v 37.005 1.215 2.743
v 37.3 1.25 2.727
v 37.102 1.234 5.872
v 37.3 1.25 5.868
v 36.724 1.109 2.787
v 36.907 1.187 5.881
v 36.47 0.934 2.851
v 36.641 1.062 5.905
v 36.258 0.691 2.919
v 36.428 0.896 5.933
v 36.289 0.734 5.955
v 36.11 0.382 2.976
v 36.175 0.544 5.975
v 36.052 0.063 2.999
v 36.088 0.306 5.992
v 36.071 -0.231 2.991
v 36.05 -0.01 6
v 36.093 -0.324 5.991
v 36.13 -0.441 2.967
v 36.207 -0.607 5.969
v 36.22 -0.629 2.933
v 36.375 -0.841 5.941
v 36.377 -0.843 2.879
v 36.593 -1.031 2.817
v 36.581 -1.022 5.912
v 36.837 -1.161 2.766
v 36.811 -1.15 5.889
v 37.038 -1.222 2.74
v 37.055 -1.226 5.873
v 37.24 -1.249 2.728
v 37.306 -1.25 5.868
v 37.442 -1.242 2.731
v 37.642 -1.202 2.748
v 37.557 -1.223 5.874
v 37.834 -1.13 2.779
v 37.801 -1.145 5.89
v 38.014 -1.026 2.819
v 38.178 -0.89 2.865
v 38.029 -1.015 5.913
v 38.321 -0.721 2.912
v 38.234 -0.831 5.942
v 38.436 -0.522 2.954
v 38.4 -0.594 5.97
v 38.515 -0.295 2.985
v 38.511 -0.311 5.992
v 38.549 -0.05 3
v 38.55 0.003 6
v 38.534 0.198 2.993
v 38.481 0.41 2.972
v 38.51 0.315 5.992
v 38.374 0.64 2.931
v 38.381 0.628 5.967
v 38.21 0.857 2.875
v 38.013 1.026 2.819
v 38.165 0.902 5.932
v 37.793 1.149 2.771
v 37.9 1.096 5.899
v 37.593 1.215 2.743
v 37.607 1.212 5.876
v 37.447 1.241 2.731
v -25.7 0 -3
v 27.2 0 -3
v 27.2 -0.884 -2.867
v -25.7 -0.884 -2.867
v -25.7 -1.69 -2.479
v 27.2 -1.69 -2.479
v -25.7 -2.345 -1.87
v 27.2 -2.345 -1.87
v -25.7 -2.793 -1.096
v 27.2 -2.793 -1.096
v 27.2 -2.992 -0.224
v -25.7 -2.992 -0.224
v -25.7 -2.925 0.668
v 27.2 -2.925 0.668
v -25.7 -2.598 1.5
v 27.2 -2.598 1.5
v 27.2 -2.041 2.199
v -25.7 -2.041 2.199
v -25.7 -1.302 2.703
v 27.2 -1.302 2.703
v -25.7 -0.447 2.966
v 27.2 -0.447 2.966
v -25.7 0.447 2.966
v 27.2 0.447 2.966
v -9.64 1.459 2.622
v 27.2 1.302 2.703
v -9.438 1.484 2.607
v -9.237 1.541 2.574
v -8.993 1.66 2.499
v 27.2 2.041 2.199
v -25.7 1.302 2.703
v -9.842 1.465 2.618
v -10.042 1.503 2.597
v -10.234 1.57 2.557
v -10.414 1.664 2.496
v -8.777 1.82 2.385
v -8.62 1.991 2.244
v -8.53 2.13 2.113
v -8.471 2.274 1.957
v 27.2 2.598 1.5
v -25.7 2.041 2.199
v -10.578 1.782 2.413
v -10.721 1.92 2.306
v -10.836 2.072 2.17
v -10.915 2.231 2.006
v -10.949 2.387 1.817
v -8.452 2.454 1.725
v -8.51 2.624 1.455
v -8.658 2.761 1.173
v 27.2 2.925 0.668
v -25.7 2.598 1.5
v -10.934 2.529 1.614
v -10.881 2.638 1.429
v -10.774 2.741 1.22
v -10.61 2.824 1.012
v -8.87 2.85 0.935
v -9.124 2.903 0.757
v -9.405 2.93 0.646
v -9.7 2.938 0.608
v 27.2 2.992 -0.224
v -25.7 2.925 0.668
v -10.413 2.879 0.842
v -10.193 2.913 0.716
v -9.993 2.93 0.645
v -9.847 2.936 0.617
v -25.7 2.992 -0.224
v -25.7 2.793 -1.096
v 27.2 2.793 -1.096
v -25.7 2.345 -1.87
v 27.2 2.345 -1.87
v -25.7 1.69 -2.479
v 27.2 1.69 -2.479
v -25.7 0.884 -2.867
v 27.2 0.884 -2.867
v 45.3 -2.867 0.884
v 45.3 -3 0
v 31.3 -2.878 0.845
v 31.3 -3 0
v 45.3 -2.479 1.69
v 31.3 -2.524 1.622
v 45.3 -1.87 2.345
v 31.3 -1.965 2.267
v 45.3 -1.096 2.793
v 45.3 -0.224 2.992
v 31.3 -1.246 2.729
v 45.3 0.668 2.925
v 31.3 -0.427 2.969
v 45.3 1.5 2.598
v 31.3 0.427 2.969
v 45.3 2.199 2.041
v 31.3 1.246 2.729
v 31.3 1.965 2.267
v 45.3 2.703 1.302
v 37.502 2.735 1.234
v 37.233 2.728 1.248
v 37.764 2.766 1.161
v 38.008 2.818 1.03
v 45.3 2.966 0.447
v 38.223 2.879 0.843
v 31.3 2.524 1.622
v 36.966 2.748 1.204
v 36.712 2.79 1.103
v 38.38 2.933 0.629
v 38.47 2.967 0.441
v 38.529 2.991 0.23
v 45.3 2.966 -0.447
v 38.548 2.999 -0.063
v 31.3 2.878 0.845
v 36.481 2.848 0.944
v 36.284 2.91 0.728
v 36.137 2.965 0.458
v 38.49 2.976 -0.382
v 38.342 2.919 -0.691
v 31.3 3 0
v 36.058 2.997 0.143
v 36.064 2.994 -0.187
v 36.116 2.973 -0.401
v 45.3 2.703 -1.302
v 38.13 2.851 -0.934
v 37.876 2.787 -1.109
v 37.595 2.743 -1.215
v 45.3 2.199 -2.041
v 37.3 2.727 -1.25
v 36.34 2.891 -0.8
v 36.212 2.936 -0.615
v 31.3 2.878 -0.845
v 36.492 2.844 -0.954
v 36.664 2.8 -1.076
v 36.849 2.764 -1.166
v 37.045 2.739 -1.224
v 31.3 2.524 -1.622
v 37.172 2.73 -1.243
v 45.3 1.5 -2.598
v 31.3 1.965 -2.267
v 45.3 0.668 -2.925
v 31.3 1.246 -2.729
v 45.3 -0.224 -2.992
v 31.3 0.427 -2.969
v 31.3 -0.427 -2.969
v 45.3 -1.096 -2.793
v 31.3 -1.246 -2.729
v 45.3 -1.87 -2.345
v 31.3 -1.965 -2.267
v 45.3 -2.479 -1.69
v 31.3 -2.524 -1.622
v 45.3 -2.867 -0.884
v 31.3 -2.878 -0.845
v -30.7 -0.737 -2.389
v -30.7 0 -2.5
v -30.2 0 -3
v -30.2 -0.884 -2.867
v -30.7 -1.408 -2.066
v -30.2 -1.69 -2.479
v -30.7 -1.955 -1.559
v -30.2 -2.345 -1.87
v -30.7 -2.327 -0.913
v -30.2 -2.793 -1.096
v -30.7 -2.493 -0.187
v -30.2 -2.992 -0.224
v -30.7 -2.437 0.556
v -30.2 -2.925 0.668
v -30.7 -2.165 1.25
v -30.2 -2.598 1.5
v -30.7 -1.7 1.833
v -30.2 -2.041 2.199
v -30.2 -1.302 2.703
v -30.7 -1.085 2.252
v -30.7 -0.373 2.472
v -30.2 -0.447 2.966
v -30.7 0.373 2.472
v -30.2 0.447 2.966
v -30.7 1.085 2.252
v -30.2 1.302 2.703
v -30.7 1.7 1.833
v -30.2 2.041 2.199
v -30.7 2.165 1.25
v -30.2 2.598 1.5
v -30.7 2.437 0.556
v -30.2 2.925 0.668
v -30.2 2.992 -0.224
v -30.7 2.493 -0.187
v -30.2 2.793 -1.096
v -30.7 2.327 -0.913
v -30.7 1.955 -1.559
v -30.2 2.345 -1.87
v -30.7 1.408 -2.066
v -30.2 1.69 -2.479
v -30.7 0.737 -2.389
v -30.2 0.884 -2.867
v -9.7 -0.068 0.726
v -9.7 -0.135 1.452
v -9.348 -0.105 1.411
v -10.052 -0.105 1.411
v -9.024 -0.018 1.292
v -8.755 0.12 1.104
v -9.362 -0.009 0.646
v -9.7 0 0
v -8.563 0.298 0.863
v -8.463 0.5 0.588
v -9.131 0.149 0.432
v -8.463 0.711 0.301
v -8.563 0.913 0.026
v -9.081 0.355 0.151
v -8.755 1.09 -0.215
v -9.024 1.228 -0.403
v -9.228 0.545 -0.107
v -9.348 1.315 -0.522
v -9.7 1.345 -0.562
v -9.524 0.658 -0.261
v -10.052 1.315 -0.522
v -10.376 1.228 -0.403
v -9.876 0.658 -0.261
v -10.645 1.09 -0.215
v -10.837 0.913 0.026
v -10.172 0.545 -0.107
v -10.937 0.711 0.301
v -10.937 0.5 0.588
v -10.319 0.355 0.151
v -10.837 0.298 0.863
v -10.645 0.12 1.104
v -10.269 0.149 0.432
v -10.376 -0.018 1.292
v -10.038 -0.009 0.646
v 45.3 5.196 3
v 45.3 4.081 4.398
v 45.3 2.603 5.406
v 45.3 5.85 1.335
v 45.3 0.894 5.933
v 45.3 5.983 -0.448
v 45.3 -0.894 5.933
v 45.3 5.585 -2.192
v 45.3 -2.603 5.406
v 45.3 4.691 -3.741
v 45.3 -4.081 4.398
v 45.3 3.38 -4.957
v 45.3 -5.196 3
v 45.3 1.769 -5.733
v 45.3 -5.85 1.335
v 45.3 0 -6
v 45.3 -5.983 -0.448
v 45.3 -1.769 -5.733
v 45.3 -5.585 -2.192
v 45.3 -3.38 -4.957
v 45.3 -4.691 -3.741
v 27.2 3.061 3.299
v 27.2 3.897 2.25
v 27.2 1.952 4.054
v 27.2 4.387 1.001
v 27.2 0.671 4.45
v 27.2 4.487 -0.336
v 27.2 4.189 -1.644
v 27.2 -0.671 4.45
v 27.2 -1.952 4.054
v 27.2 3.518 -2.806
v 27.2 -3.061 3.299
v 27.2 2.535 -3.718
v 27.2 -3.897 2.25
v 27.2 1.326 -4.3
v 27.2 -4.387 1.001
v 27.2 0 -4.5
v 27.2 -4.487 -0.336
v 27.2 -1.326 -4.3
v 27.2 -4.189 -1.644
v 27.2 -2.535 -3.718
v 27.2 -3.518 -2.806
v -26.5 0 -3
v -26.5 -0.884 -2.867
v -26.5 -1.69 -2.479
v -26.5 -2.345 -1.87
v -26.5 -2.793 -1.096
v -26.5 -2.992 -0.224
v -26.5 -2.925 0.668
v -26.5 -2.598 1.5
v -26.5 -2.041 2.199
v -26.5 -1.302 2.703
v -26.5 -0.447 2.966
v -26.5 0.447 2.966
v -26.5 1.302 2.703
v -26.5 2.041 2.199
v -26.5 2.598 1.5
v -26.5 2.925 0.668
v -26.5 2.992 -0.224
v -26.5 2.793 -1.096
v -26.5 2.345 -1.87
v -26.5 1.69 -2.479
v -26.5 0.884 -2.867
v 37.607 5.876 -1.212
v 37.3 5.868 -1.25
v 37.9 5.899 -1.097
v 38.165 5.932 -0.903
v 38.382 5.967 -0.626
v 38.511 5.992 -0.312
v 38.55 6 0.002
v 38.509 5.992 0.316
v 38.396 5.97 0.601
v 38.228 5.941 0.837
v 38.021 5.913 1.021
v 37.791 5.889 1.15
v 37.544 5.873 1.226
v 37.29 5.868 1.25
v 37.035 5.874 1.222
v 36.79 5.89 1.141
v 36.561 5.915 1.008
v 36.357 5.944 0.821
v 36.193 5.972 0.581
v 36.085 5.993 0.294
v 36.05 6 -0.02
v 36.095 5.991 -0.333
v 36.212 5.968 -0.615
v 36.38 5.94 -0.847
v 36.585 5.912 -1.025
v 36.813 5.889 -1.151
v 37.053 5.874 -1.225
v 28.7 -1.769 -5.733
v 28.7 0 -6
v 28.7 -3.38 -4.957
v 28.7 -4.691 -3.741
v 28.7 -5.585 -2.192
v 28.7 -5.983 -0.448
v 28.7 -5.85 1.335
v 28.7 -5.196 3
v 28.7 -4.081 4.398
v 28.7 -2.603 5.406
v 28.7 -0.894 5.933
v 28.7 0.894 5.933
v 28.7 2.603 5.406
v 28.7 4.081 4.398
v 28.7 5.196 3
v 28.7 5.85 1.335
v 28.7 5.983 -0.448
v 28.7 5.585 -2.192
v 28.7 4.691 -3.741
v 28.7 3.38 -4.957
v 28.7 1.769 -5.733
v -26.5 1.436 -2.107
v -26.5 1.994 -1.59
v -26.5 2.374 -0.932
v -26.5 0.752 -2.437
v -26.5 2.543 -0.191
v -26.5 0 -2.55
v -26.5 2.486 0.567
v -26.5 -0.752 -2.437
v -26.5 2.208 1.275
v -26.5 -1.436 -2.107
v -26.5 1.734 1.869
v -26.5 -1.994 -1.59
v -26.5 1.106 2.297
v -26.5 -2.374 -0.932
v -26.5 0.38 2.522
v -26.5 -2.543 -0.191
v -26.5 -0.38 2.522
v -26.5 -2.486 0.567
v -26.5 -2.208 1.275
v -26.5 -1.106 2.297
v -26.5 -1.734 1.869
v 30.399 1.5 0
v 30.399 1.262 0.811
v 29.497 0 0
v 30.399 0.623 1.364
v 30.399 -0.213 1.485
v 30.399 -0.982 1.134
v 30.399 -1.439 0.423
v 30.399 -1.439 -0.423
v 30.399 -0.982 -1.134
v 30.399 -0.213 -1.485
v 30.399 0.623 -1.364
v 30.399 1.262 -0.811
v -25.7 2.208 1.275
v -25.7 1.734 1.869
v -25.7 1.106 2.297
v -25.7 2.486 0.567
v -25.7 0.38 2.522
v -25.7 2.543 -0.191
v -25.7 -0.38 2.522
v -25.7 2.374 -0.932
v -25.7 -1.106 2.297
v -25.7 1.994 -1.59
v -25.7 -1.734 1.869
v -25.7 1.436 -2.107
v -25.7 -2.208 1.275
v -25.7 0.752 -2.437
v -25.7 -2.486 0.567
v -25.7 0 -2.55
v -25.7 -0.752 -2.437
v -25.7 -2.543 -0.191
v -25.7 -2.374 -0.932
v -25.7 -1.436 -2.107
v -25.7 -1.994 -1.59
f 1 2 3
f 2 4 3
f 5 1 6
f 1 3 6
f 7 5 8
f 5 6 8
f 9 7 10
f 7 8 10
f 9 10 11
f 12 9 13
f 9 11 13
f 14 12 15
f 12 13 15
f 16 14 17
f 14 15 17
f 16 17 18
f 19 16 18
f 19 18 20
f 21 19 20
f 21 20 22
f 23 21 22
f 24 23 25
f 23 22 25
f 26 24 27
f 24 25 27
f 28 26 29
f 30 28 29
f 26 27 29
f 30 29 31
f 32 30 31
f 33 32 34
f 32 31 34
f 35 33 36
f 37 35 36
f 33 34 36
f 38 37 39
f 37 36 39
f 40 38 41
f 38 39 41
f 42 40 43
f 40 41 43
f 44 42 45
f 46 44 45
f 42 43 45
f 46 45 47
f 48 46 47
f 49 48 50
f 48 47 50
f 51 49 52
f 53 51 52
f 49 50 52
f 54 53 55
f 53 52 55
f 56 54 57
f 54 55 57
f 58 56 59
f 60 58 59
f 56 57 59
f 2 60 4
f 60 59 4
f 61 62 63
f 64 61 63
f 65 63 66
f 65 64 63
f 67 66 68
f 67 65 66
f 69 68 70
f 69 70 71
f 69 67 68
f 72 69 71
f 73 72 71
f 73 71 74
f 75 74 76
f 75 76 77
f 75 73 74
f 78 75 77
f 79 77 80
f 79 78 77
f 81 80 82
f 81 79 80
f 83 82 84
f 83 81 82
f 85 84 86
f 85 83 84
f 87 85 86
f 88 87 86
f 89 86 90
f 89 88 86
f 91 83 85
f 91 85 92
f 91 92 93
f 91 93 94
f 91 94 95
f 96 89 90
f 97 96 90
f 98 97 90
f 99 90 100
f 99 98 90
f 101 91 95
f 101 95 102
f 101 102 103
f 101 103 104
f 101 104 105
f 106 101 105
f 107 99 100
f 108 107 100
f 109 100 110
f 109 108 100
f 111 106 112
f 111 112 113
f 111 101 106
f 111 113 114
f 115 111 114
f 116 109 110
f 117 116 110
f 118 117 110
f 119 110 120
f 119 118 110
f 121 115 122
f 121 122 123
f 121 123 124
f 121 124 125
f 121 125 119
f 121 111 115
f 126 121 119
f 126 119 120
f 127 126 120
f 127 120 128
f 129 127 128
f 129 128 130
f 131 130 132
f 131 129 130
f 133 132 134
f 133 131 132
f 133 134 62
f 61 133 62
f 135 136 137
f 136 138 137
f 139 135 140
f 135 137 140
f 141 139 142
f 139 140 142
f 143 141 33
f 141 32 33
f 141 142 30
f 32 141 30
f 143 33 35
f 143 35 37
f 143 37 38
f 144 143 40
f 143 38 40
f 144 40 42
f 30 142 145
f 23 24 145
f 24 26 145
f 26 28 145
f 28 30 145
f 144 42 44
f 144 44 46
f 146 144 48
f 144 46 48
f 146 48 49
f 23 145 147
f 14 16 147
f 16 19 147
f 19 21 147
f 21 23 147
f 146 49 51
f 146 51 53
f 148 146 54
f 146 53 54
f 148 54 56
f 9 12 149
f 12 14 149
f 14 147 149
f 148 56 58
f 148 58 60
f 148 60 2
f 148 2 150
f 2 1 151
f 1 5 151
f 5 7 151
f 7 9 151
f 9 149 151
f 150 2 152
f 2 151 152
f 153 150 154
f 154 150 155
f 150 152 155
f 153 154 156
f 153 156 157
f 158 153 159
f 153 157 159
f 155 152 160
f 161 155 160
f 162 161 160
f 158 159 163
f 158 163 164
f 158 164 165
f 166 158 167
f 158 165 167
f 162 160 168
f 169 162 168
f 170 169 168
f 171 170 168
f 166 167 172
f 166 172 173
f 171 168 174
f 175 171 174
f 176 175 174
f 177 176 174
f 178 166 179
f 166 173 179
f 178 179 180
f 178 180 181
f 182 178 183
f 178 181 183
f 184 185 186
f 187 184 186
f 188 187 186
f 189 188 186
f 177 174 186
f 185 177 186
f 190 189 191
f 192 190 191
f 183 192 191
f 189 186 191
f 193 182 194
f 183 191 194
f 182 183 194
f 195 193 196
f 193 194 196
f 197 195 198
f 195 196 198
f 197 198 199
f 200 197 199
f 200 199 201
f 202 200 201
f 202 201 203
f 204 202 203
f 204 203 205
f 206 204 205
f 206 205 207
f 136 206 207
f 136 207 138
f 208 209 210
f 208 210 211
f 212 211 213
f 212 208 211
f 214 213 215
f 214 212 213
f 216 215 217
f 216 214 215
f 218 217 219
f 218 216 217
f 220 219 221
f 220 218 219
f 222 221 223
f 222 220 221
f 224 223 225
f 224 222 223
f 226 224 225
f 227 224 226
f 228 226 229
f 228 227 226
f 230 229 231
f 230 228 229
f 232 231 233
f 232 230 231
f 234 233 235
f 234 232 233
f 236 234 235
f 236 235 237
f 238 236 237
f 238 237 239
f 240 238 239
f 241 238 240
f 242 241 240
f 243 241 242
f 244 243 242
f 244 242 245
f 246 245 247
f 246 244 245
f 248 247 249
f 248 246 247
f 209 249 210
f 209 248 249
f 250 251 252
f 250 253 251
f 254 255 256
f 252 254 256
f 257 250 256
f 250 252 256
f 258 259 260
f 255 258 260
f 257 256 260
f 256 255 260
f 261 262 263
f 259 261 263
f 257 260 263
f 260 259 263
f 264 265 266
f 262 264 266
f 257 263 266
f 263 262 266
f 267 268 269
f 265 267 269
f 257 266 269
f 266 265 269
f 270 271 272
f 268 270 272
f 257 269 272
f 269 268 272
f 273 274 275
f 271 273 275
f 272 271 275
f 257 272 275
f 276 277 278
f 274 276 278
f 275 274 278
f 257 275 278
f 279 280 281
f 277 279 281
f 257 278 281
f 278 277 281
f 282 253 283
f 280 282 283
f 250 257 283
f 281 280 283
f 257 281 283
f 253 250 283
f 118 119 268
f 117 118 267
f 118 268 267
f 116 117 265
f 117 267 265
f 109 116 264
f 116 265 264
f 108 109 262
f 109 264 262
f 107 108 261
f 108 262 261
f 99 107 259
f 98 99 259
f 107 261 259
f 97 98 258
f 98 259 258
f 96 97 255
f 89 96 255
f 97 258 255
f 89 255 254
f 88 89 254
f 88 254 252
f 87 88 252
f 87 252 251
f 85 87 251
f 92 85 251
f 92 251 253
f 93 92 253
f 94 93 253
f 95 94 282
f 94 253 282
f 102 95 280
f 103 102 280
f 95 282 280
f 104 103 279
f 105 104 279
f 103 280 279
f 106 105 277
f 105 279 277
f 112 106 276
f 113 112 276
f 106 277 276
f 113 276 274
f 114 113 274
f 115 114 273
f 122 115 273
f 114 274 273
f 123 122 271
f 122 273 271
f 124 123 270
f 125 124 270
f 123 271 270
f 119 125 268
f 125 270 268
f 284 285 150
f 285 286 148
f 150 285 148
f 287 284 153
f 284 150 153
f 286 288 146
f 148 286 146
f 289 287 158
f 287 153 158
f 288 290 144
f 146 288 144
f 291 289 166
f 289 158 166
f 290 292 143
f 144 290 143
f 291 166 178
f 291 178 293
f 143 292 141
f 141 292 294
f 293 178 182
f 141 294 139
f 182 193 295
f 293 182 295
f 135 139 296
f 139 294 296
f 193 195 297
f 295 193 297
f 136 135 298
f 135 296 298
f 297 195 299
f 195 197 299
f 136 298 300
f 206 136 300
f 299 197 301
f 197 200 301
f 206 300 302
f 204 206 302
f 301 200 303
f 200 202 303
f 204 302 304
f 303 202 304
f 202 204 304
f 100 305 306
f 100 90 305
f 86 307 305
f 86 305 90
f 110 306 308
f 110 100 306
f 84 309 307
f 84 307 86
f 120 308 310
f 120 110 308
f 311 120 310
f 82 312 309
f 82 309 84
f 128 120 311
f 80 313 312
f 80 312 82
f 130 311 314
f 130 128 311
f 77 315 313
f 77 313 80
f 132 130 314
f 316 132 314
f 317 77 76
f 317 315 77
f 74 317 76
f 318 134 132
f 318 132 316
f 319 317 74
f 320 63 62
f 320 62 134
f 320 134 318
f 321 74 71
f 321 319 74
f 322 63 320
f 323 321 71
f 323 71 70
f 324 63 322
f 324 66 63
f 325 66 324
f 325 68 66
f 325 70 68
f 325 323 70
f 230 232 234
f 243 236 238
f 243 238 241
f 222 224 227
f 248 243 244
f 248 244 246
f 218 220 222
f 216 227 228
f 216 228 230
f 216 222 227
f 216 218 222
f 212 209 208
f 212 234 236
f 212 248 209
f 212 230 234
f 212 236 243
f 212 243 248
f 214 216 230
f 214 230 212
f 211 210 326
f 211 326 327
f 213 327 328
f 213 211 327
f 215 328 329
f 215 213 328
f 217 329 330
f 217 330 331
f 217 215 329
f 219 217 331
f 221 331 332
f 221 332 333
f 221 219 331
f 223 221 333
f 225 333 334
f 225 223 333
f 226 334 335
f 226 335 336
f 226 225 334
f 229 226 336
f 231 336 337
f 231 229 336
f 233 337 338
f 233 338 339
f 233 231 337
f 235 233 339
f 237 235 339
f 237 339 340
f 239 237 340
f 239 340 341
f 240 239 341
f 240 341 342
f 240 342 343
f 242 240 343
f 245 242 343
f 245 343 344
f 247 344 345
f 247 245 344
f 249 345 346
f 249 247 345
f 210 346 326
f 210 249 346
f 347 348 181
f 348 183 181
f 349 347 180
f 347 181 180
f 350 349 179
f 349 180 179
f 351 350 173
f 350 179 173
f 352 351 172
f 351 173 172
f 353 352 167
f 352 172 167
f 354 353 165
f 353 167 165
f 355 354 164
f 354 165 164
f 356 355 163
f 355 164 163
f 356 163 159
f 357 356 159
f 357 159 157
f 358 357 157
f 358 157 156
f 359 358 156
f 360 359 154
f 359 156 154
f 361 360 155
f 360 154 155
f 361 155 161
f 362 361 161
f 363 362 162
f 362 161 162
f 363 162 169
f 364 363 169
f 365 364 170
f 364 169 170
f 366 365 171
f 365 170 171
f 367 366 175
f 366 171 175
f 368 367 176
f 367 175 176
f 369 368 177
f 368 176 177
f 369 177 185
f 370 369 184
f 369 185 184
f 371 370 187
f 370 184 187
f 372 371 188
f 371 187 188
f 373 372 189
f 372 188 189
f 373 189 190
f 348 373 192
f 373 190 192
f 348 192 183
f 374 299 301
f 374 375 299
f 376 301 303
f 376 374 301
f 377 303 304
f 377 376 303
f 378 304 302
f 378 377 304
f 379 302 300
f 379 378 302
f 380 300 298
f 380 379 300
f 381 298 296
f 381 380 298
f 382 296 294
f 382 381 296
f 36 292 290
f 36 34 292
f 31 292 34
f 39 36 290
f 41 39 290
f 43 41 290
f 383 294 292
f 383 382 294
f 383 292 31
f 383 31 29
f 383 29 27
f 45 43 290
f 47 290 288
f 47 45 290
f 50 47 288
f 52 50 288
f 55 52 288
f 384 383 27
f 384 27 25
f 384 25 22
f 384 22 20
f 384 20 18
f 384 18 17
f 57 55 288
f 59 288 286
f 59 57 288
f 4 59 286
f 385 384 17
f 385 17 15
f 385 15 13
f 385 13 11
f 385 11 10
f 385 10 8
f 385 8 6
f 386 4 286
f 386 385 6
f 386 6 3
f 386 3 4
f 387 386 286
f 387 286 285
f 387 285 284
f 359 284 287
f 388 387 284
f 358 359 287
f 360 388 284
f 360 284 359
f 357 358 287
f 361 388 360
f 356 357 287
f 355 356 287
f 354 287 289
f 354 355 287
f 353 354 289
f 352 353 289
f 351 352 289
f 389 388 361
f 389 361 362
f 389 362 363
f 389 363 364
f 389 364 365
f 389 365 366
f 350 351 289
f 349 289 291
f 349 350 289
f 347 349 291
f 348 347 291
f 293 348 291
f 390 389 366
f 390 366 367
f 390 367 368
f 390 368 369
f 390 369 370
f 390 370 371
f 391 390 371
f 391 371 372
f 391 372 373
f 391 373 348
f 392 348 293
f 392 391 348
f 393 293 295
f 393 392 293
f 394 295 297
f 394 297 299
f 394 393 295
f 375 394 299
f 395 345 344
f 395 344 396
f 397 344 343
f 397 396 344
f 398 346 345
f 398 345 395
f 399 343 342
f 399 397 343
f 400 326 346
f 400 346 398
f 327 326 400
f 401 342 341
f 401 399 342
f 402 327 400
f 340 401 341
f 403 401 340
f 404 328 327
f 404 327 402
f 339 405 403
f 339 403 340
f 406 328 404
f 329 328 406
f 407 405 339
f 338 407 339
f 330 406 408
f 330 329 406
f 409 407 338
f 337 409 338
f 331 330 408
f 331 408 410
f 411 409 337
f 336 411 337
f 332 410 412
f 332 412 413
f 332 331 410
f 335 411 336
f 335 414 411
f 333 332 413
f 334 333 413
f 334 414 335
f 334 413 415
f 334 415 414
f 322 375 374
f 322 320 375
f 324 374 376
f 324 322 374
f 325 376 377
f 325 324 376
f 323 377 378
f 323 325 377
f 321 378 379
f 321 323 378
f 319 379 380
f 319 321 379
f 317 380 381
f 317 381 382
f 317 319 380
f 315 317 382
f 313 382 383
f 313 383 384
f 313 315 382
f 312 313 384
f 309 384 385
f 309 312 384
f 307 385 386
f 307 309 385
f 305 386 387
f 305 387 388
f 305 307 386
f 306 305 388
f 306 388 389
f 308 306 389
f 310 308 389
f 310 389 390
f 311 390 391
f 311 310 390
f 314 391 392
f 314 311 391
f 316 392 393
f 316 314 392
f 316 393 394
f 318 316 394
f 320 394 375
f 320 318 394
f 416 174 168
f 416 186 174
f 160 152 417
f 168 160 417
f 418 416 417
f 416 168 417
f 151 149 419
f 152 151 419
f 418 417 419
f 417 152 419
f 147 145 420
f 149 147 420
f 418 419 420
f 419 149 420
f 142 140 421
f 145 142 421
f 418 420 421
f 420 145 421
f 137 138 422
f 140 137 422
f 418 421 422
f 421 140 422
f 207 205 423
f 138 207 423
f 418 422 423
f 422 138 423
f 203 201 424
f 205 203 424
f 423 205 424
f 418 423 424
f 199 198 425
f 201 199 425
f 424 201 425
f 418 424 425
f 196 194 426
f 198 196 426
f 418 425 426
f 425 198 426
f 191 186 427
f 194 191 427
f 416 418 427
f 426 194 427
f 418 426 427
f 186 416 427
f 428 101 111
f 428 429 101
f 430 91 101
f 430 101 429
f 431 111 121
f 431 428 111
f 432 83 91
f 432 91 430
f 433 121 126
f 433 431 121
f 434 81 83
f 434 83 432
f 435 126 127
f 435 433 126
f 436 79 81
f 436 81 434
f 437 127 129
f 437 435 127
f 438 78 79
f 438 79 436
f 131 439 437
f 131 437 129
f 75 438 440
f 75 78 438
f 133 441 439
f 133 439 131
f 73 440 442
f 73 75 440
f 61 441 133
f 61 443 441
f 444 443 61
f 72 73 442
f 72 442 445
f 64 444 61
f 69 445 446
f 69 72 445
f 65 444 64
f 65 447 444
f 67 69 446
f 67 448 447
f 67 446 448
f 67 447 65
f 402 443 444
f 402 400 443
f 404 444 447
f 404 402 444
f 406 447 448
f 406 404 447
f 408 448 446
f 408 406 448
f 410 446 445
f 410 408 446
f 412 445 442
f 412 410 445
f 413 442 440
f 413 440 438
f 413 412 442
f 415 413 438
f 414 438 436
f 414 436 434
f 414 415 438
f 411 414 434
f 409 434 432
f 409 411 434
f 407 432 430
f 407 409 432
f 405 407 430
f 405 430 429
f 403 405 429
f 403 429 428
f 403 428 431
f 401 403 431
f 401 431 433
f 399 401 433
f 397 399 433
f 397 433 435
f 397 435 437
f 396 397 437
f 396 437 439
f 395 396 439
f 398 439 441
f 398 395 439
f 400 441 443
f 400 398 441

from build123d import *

# Parameters (mm, degrees)
CHAFL_N1_SIZE                                  = 0.5
PERFORADOR_PARA_ROSCAR_PARA_MACHO_DE_ROS_D     = 2.5
PERFORADOR_PARA_ROSCAR_PARA_MACHO_DE_ROS_DEPTH = 6
PERFORADOR_PARA_ROSCAR_PARA_MACHO_DE_ROS_TIP   = 0.751075774
CROQUIS12_W                                    = 1.25
CROQUIS12_H                                    = 6
TALADROS_DE_ESPIGA_DE_6_0MM1_D                 = 6
TALADROS_DE_ESPIGA_DE_6_0MM1_DEPTH             = 14
TALADROS_DE_ESPIGA_DE_6_0MM1_TIP               = 1.802581857
PERFORADOR_PARA_ROSCAR_PARA_MACHO_DE_3_D       = 2.5
PERFORADOR_PARA_ROSCAR_PARA_MACHO_DE_3_DEPTH   = 2.248924226
PERFORADOR_PARA_ROSCAR_PARA_MACHO_DE_3_TIP     = 0.751075774


with BuildPart() as part:
    # Croquis1 → Revolución1 (revolve)
    with BuildSketch(Plane(origin=(0, 0, 0), x_dir=(-1, 0, 0), z_dir=(0, 1, 0)), mode=Mode.PRIVATE) as revoluci_n1_sk:
        Polygon((-45.3, 3), (-45.3, 6), (-28.7, 6), (-27.2, 4.5), (-27.2, 3), (25.7, 3), (25.7, 2.55), (26.5, 2.55), (26.5, 3), (30.7, 3), (30.7, 0), (-30.7, 0), (-45.3, 0), align=None)
    revolve(revoluci_n1_sk.sketch.rotate(Axis((30.7, 0, 0), (-1, 0, 0)), 180), axis=Axis((30.7, 0, 0), (-1, 0, 0)))

    # Chaflán1
    chafl_n1_edges = [part.edges().sort_by_distance(p)[0] for p in [
        (-30.7, 0, 3),
    ]]
    chamfer(chafl_n1_edges, length=CHAFL_N1_SIZE)

    # Perforador para roscar para macho de ros
    with Locations(Plane(origin=(0, 6, -6), x_dir=(0, 0, 1), z_dir=(0, 1, 0))):
        with Locations((6, 37.3)):
            Hole(PERFORADOR_PARA_ROSCAR_PARA_MACHO_DE_ROS_D / 2, depth=PERFORADOR_PARA_ROSCAR_PARA_MACHO_DE_ROS_DEPTH)
            with Locations((0, 0, -(PERFORADOR_PARA_ROSCAR_PARA_MACHO_DE_ROS_DEPTH + PERFORADOR_PARA_ROSCAR_PARA_MACHO_DE_ROS_TIP / 2))):  # 118° drill point
                Cone(0, PERFORADOR_PARA_ROSCAR_PARA_MACHO_DE_ROS_D / 2, PERFORADOR_PARA_ROSCAR_PARA_MACHO_DE_ROS_TIP, mode=Mode.SUBTRACT)

    # Croquis12 → Perforador para roscar para macho de 2 (revolve, cut)
    with BuildSketch(Plane.YZ.offset(37.3)):
        with Locations((0.625, 3)):
            Rectangle(CROQUIS12_W, CROQUIS12_H)
    revolve(axis=Axis((37.3, 0, -6.35), (0, 0, 1)), mode=Mode.SUBTRACT)

    # Taladros de espiga de Ø6.0mm1
    with Locations(Plane.YZ.offset(45.3)):
        with Locations((0, 0)):
            Hole(TALADROS_DE_ESPIGA_DE_6_0MM1_D / 2, depth=TALADROS_DE_ESPIGA_DE_6_0MM1_DEPTH)
            with Locations((0, 0, -(TALADROS_DE_ESPIGA_DE_6_0MM1_DEPTH + TALADROS_DE_ESPIGA_DE_6_0MM1_TIP / 2))):  # 118° drill point
                Cone(0, TALADROS_DE_ESPIGA_DE_6_0MM1_D / 2, TALADROS_DE_ESPIGA_DE_6_0MM1_TIP, mode=Mode.SUBTRACT)

    # Perforador para roscar para macho de 3
    with Locations(Plane(origin=(-9.7, 2.417350066, 1.776631267), x_dir=(0, -0.592210422366, 0.805783355276), z_dir=(0, 0.805783355276, 0.592210422366))):
        with Locations((0, 0)):
            Hole(PERFORADOR_PARA_ROSCAR_PARA_MACHO_DE_3_D / 2, depth=PERFORADOR_PARA_ROSCAR_PARA_MACHO_DE_3_DEPTH)
            with Locations((0, 0, -(PERFORADOR_PARA_ROSCAR_PARA_MACHO_DE_3_DEPTH + PERFORADOR_PARA_ROSCAR_PARA_MACHO_DE_3_TIP / 2))):  # 118° drill point
                Cone(0, PERFORADOR_PARA_ROSCAR_PARA_MACHO_DE_3_D / 2, PERFORADOR_PARA_ROSCAR_PARA_MACHO_DE_3_TIP, mode=Mode.SUBTRACT)


solid = part.part
